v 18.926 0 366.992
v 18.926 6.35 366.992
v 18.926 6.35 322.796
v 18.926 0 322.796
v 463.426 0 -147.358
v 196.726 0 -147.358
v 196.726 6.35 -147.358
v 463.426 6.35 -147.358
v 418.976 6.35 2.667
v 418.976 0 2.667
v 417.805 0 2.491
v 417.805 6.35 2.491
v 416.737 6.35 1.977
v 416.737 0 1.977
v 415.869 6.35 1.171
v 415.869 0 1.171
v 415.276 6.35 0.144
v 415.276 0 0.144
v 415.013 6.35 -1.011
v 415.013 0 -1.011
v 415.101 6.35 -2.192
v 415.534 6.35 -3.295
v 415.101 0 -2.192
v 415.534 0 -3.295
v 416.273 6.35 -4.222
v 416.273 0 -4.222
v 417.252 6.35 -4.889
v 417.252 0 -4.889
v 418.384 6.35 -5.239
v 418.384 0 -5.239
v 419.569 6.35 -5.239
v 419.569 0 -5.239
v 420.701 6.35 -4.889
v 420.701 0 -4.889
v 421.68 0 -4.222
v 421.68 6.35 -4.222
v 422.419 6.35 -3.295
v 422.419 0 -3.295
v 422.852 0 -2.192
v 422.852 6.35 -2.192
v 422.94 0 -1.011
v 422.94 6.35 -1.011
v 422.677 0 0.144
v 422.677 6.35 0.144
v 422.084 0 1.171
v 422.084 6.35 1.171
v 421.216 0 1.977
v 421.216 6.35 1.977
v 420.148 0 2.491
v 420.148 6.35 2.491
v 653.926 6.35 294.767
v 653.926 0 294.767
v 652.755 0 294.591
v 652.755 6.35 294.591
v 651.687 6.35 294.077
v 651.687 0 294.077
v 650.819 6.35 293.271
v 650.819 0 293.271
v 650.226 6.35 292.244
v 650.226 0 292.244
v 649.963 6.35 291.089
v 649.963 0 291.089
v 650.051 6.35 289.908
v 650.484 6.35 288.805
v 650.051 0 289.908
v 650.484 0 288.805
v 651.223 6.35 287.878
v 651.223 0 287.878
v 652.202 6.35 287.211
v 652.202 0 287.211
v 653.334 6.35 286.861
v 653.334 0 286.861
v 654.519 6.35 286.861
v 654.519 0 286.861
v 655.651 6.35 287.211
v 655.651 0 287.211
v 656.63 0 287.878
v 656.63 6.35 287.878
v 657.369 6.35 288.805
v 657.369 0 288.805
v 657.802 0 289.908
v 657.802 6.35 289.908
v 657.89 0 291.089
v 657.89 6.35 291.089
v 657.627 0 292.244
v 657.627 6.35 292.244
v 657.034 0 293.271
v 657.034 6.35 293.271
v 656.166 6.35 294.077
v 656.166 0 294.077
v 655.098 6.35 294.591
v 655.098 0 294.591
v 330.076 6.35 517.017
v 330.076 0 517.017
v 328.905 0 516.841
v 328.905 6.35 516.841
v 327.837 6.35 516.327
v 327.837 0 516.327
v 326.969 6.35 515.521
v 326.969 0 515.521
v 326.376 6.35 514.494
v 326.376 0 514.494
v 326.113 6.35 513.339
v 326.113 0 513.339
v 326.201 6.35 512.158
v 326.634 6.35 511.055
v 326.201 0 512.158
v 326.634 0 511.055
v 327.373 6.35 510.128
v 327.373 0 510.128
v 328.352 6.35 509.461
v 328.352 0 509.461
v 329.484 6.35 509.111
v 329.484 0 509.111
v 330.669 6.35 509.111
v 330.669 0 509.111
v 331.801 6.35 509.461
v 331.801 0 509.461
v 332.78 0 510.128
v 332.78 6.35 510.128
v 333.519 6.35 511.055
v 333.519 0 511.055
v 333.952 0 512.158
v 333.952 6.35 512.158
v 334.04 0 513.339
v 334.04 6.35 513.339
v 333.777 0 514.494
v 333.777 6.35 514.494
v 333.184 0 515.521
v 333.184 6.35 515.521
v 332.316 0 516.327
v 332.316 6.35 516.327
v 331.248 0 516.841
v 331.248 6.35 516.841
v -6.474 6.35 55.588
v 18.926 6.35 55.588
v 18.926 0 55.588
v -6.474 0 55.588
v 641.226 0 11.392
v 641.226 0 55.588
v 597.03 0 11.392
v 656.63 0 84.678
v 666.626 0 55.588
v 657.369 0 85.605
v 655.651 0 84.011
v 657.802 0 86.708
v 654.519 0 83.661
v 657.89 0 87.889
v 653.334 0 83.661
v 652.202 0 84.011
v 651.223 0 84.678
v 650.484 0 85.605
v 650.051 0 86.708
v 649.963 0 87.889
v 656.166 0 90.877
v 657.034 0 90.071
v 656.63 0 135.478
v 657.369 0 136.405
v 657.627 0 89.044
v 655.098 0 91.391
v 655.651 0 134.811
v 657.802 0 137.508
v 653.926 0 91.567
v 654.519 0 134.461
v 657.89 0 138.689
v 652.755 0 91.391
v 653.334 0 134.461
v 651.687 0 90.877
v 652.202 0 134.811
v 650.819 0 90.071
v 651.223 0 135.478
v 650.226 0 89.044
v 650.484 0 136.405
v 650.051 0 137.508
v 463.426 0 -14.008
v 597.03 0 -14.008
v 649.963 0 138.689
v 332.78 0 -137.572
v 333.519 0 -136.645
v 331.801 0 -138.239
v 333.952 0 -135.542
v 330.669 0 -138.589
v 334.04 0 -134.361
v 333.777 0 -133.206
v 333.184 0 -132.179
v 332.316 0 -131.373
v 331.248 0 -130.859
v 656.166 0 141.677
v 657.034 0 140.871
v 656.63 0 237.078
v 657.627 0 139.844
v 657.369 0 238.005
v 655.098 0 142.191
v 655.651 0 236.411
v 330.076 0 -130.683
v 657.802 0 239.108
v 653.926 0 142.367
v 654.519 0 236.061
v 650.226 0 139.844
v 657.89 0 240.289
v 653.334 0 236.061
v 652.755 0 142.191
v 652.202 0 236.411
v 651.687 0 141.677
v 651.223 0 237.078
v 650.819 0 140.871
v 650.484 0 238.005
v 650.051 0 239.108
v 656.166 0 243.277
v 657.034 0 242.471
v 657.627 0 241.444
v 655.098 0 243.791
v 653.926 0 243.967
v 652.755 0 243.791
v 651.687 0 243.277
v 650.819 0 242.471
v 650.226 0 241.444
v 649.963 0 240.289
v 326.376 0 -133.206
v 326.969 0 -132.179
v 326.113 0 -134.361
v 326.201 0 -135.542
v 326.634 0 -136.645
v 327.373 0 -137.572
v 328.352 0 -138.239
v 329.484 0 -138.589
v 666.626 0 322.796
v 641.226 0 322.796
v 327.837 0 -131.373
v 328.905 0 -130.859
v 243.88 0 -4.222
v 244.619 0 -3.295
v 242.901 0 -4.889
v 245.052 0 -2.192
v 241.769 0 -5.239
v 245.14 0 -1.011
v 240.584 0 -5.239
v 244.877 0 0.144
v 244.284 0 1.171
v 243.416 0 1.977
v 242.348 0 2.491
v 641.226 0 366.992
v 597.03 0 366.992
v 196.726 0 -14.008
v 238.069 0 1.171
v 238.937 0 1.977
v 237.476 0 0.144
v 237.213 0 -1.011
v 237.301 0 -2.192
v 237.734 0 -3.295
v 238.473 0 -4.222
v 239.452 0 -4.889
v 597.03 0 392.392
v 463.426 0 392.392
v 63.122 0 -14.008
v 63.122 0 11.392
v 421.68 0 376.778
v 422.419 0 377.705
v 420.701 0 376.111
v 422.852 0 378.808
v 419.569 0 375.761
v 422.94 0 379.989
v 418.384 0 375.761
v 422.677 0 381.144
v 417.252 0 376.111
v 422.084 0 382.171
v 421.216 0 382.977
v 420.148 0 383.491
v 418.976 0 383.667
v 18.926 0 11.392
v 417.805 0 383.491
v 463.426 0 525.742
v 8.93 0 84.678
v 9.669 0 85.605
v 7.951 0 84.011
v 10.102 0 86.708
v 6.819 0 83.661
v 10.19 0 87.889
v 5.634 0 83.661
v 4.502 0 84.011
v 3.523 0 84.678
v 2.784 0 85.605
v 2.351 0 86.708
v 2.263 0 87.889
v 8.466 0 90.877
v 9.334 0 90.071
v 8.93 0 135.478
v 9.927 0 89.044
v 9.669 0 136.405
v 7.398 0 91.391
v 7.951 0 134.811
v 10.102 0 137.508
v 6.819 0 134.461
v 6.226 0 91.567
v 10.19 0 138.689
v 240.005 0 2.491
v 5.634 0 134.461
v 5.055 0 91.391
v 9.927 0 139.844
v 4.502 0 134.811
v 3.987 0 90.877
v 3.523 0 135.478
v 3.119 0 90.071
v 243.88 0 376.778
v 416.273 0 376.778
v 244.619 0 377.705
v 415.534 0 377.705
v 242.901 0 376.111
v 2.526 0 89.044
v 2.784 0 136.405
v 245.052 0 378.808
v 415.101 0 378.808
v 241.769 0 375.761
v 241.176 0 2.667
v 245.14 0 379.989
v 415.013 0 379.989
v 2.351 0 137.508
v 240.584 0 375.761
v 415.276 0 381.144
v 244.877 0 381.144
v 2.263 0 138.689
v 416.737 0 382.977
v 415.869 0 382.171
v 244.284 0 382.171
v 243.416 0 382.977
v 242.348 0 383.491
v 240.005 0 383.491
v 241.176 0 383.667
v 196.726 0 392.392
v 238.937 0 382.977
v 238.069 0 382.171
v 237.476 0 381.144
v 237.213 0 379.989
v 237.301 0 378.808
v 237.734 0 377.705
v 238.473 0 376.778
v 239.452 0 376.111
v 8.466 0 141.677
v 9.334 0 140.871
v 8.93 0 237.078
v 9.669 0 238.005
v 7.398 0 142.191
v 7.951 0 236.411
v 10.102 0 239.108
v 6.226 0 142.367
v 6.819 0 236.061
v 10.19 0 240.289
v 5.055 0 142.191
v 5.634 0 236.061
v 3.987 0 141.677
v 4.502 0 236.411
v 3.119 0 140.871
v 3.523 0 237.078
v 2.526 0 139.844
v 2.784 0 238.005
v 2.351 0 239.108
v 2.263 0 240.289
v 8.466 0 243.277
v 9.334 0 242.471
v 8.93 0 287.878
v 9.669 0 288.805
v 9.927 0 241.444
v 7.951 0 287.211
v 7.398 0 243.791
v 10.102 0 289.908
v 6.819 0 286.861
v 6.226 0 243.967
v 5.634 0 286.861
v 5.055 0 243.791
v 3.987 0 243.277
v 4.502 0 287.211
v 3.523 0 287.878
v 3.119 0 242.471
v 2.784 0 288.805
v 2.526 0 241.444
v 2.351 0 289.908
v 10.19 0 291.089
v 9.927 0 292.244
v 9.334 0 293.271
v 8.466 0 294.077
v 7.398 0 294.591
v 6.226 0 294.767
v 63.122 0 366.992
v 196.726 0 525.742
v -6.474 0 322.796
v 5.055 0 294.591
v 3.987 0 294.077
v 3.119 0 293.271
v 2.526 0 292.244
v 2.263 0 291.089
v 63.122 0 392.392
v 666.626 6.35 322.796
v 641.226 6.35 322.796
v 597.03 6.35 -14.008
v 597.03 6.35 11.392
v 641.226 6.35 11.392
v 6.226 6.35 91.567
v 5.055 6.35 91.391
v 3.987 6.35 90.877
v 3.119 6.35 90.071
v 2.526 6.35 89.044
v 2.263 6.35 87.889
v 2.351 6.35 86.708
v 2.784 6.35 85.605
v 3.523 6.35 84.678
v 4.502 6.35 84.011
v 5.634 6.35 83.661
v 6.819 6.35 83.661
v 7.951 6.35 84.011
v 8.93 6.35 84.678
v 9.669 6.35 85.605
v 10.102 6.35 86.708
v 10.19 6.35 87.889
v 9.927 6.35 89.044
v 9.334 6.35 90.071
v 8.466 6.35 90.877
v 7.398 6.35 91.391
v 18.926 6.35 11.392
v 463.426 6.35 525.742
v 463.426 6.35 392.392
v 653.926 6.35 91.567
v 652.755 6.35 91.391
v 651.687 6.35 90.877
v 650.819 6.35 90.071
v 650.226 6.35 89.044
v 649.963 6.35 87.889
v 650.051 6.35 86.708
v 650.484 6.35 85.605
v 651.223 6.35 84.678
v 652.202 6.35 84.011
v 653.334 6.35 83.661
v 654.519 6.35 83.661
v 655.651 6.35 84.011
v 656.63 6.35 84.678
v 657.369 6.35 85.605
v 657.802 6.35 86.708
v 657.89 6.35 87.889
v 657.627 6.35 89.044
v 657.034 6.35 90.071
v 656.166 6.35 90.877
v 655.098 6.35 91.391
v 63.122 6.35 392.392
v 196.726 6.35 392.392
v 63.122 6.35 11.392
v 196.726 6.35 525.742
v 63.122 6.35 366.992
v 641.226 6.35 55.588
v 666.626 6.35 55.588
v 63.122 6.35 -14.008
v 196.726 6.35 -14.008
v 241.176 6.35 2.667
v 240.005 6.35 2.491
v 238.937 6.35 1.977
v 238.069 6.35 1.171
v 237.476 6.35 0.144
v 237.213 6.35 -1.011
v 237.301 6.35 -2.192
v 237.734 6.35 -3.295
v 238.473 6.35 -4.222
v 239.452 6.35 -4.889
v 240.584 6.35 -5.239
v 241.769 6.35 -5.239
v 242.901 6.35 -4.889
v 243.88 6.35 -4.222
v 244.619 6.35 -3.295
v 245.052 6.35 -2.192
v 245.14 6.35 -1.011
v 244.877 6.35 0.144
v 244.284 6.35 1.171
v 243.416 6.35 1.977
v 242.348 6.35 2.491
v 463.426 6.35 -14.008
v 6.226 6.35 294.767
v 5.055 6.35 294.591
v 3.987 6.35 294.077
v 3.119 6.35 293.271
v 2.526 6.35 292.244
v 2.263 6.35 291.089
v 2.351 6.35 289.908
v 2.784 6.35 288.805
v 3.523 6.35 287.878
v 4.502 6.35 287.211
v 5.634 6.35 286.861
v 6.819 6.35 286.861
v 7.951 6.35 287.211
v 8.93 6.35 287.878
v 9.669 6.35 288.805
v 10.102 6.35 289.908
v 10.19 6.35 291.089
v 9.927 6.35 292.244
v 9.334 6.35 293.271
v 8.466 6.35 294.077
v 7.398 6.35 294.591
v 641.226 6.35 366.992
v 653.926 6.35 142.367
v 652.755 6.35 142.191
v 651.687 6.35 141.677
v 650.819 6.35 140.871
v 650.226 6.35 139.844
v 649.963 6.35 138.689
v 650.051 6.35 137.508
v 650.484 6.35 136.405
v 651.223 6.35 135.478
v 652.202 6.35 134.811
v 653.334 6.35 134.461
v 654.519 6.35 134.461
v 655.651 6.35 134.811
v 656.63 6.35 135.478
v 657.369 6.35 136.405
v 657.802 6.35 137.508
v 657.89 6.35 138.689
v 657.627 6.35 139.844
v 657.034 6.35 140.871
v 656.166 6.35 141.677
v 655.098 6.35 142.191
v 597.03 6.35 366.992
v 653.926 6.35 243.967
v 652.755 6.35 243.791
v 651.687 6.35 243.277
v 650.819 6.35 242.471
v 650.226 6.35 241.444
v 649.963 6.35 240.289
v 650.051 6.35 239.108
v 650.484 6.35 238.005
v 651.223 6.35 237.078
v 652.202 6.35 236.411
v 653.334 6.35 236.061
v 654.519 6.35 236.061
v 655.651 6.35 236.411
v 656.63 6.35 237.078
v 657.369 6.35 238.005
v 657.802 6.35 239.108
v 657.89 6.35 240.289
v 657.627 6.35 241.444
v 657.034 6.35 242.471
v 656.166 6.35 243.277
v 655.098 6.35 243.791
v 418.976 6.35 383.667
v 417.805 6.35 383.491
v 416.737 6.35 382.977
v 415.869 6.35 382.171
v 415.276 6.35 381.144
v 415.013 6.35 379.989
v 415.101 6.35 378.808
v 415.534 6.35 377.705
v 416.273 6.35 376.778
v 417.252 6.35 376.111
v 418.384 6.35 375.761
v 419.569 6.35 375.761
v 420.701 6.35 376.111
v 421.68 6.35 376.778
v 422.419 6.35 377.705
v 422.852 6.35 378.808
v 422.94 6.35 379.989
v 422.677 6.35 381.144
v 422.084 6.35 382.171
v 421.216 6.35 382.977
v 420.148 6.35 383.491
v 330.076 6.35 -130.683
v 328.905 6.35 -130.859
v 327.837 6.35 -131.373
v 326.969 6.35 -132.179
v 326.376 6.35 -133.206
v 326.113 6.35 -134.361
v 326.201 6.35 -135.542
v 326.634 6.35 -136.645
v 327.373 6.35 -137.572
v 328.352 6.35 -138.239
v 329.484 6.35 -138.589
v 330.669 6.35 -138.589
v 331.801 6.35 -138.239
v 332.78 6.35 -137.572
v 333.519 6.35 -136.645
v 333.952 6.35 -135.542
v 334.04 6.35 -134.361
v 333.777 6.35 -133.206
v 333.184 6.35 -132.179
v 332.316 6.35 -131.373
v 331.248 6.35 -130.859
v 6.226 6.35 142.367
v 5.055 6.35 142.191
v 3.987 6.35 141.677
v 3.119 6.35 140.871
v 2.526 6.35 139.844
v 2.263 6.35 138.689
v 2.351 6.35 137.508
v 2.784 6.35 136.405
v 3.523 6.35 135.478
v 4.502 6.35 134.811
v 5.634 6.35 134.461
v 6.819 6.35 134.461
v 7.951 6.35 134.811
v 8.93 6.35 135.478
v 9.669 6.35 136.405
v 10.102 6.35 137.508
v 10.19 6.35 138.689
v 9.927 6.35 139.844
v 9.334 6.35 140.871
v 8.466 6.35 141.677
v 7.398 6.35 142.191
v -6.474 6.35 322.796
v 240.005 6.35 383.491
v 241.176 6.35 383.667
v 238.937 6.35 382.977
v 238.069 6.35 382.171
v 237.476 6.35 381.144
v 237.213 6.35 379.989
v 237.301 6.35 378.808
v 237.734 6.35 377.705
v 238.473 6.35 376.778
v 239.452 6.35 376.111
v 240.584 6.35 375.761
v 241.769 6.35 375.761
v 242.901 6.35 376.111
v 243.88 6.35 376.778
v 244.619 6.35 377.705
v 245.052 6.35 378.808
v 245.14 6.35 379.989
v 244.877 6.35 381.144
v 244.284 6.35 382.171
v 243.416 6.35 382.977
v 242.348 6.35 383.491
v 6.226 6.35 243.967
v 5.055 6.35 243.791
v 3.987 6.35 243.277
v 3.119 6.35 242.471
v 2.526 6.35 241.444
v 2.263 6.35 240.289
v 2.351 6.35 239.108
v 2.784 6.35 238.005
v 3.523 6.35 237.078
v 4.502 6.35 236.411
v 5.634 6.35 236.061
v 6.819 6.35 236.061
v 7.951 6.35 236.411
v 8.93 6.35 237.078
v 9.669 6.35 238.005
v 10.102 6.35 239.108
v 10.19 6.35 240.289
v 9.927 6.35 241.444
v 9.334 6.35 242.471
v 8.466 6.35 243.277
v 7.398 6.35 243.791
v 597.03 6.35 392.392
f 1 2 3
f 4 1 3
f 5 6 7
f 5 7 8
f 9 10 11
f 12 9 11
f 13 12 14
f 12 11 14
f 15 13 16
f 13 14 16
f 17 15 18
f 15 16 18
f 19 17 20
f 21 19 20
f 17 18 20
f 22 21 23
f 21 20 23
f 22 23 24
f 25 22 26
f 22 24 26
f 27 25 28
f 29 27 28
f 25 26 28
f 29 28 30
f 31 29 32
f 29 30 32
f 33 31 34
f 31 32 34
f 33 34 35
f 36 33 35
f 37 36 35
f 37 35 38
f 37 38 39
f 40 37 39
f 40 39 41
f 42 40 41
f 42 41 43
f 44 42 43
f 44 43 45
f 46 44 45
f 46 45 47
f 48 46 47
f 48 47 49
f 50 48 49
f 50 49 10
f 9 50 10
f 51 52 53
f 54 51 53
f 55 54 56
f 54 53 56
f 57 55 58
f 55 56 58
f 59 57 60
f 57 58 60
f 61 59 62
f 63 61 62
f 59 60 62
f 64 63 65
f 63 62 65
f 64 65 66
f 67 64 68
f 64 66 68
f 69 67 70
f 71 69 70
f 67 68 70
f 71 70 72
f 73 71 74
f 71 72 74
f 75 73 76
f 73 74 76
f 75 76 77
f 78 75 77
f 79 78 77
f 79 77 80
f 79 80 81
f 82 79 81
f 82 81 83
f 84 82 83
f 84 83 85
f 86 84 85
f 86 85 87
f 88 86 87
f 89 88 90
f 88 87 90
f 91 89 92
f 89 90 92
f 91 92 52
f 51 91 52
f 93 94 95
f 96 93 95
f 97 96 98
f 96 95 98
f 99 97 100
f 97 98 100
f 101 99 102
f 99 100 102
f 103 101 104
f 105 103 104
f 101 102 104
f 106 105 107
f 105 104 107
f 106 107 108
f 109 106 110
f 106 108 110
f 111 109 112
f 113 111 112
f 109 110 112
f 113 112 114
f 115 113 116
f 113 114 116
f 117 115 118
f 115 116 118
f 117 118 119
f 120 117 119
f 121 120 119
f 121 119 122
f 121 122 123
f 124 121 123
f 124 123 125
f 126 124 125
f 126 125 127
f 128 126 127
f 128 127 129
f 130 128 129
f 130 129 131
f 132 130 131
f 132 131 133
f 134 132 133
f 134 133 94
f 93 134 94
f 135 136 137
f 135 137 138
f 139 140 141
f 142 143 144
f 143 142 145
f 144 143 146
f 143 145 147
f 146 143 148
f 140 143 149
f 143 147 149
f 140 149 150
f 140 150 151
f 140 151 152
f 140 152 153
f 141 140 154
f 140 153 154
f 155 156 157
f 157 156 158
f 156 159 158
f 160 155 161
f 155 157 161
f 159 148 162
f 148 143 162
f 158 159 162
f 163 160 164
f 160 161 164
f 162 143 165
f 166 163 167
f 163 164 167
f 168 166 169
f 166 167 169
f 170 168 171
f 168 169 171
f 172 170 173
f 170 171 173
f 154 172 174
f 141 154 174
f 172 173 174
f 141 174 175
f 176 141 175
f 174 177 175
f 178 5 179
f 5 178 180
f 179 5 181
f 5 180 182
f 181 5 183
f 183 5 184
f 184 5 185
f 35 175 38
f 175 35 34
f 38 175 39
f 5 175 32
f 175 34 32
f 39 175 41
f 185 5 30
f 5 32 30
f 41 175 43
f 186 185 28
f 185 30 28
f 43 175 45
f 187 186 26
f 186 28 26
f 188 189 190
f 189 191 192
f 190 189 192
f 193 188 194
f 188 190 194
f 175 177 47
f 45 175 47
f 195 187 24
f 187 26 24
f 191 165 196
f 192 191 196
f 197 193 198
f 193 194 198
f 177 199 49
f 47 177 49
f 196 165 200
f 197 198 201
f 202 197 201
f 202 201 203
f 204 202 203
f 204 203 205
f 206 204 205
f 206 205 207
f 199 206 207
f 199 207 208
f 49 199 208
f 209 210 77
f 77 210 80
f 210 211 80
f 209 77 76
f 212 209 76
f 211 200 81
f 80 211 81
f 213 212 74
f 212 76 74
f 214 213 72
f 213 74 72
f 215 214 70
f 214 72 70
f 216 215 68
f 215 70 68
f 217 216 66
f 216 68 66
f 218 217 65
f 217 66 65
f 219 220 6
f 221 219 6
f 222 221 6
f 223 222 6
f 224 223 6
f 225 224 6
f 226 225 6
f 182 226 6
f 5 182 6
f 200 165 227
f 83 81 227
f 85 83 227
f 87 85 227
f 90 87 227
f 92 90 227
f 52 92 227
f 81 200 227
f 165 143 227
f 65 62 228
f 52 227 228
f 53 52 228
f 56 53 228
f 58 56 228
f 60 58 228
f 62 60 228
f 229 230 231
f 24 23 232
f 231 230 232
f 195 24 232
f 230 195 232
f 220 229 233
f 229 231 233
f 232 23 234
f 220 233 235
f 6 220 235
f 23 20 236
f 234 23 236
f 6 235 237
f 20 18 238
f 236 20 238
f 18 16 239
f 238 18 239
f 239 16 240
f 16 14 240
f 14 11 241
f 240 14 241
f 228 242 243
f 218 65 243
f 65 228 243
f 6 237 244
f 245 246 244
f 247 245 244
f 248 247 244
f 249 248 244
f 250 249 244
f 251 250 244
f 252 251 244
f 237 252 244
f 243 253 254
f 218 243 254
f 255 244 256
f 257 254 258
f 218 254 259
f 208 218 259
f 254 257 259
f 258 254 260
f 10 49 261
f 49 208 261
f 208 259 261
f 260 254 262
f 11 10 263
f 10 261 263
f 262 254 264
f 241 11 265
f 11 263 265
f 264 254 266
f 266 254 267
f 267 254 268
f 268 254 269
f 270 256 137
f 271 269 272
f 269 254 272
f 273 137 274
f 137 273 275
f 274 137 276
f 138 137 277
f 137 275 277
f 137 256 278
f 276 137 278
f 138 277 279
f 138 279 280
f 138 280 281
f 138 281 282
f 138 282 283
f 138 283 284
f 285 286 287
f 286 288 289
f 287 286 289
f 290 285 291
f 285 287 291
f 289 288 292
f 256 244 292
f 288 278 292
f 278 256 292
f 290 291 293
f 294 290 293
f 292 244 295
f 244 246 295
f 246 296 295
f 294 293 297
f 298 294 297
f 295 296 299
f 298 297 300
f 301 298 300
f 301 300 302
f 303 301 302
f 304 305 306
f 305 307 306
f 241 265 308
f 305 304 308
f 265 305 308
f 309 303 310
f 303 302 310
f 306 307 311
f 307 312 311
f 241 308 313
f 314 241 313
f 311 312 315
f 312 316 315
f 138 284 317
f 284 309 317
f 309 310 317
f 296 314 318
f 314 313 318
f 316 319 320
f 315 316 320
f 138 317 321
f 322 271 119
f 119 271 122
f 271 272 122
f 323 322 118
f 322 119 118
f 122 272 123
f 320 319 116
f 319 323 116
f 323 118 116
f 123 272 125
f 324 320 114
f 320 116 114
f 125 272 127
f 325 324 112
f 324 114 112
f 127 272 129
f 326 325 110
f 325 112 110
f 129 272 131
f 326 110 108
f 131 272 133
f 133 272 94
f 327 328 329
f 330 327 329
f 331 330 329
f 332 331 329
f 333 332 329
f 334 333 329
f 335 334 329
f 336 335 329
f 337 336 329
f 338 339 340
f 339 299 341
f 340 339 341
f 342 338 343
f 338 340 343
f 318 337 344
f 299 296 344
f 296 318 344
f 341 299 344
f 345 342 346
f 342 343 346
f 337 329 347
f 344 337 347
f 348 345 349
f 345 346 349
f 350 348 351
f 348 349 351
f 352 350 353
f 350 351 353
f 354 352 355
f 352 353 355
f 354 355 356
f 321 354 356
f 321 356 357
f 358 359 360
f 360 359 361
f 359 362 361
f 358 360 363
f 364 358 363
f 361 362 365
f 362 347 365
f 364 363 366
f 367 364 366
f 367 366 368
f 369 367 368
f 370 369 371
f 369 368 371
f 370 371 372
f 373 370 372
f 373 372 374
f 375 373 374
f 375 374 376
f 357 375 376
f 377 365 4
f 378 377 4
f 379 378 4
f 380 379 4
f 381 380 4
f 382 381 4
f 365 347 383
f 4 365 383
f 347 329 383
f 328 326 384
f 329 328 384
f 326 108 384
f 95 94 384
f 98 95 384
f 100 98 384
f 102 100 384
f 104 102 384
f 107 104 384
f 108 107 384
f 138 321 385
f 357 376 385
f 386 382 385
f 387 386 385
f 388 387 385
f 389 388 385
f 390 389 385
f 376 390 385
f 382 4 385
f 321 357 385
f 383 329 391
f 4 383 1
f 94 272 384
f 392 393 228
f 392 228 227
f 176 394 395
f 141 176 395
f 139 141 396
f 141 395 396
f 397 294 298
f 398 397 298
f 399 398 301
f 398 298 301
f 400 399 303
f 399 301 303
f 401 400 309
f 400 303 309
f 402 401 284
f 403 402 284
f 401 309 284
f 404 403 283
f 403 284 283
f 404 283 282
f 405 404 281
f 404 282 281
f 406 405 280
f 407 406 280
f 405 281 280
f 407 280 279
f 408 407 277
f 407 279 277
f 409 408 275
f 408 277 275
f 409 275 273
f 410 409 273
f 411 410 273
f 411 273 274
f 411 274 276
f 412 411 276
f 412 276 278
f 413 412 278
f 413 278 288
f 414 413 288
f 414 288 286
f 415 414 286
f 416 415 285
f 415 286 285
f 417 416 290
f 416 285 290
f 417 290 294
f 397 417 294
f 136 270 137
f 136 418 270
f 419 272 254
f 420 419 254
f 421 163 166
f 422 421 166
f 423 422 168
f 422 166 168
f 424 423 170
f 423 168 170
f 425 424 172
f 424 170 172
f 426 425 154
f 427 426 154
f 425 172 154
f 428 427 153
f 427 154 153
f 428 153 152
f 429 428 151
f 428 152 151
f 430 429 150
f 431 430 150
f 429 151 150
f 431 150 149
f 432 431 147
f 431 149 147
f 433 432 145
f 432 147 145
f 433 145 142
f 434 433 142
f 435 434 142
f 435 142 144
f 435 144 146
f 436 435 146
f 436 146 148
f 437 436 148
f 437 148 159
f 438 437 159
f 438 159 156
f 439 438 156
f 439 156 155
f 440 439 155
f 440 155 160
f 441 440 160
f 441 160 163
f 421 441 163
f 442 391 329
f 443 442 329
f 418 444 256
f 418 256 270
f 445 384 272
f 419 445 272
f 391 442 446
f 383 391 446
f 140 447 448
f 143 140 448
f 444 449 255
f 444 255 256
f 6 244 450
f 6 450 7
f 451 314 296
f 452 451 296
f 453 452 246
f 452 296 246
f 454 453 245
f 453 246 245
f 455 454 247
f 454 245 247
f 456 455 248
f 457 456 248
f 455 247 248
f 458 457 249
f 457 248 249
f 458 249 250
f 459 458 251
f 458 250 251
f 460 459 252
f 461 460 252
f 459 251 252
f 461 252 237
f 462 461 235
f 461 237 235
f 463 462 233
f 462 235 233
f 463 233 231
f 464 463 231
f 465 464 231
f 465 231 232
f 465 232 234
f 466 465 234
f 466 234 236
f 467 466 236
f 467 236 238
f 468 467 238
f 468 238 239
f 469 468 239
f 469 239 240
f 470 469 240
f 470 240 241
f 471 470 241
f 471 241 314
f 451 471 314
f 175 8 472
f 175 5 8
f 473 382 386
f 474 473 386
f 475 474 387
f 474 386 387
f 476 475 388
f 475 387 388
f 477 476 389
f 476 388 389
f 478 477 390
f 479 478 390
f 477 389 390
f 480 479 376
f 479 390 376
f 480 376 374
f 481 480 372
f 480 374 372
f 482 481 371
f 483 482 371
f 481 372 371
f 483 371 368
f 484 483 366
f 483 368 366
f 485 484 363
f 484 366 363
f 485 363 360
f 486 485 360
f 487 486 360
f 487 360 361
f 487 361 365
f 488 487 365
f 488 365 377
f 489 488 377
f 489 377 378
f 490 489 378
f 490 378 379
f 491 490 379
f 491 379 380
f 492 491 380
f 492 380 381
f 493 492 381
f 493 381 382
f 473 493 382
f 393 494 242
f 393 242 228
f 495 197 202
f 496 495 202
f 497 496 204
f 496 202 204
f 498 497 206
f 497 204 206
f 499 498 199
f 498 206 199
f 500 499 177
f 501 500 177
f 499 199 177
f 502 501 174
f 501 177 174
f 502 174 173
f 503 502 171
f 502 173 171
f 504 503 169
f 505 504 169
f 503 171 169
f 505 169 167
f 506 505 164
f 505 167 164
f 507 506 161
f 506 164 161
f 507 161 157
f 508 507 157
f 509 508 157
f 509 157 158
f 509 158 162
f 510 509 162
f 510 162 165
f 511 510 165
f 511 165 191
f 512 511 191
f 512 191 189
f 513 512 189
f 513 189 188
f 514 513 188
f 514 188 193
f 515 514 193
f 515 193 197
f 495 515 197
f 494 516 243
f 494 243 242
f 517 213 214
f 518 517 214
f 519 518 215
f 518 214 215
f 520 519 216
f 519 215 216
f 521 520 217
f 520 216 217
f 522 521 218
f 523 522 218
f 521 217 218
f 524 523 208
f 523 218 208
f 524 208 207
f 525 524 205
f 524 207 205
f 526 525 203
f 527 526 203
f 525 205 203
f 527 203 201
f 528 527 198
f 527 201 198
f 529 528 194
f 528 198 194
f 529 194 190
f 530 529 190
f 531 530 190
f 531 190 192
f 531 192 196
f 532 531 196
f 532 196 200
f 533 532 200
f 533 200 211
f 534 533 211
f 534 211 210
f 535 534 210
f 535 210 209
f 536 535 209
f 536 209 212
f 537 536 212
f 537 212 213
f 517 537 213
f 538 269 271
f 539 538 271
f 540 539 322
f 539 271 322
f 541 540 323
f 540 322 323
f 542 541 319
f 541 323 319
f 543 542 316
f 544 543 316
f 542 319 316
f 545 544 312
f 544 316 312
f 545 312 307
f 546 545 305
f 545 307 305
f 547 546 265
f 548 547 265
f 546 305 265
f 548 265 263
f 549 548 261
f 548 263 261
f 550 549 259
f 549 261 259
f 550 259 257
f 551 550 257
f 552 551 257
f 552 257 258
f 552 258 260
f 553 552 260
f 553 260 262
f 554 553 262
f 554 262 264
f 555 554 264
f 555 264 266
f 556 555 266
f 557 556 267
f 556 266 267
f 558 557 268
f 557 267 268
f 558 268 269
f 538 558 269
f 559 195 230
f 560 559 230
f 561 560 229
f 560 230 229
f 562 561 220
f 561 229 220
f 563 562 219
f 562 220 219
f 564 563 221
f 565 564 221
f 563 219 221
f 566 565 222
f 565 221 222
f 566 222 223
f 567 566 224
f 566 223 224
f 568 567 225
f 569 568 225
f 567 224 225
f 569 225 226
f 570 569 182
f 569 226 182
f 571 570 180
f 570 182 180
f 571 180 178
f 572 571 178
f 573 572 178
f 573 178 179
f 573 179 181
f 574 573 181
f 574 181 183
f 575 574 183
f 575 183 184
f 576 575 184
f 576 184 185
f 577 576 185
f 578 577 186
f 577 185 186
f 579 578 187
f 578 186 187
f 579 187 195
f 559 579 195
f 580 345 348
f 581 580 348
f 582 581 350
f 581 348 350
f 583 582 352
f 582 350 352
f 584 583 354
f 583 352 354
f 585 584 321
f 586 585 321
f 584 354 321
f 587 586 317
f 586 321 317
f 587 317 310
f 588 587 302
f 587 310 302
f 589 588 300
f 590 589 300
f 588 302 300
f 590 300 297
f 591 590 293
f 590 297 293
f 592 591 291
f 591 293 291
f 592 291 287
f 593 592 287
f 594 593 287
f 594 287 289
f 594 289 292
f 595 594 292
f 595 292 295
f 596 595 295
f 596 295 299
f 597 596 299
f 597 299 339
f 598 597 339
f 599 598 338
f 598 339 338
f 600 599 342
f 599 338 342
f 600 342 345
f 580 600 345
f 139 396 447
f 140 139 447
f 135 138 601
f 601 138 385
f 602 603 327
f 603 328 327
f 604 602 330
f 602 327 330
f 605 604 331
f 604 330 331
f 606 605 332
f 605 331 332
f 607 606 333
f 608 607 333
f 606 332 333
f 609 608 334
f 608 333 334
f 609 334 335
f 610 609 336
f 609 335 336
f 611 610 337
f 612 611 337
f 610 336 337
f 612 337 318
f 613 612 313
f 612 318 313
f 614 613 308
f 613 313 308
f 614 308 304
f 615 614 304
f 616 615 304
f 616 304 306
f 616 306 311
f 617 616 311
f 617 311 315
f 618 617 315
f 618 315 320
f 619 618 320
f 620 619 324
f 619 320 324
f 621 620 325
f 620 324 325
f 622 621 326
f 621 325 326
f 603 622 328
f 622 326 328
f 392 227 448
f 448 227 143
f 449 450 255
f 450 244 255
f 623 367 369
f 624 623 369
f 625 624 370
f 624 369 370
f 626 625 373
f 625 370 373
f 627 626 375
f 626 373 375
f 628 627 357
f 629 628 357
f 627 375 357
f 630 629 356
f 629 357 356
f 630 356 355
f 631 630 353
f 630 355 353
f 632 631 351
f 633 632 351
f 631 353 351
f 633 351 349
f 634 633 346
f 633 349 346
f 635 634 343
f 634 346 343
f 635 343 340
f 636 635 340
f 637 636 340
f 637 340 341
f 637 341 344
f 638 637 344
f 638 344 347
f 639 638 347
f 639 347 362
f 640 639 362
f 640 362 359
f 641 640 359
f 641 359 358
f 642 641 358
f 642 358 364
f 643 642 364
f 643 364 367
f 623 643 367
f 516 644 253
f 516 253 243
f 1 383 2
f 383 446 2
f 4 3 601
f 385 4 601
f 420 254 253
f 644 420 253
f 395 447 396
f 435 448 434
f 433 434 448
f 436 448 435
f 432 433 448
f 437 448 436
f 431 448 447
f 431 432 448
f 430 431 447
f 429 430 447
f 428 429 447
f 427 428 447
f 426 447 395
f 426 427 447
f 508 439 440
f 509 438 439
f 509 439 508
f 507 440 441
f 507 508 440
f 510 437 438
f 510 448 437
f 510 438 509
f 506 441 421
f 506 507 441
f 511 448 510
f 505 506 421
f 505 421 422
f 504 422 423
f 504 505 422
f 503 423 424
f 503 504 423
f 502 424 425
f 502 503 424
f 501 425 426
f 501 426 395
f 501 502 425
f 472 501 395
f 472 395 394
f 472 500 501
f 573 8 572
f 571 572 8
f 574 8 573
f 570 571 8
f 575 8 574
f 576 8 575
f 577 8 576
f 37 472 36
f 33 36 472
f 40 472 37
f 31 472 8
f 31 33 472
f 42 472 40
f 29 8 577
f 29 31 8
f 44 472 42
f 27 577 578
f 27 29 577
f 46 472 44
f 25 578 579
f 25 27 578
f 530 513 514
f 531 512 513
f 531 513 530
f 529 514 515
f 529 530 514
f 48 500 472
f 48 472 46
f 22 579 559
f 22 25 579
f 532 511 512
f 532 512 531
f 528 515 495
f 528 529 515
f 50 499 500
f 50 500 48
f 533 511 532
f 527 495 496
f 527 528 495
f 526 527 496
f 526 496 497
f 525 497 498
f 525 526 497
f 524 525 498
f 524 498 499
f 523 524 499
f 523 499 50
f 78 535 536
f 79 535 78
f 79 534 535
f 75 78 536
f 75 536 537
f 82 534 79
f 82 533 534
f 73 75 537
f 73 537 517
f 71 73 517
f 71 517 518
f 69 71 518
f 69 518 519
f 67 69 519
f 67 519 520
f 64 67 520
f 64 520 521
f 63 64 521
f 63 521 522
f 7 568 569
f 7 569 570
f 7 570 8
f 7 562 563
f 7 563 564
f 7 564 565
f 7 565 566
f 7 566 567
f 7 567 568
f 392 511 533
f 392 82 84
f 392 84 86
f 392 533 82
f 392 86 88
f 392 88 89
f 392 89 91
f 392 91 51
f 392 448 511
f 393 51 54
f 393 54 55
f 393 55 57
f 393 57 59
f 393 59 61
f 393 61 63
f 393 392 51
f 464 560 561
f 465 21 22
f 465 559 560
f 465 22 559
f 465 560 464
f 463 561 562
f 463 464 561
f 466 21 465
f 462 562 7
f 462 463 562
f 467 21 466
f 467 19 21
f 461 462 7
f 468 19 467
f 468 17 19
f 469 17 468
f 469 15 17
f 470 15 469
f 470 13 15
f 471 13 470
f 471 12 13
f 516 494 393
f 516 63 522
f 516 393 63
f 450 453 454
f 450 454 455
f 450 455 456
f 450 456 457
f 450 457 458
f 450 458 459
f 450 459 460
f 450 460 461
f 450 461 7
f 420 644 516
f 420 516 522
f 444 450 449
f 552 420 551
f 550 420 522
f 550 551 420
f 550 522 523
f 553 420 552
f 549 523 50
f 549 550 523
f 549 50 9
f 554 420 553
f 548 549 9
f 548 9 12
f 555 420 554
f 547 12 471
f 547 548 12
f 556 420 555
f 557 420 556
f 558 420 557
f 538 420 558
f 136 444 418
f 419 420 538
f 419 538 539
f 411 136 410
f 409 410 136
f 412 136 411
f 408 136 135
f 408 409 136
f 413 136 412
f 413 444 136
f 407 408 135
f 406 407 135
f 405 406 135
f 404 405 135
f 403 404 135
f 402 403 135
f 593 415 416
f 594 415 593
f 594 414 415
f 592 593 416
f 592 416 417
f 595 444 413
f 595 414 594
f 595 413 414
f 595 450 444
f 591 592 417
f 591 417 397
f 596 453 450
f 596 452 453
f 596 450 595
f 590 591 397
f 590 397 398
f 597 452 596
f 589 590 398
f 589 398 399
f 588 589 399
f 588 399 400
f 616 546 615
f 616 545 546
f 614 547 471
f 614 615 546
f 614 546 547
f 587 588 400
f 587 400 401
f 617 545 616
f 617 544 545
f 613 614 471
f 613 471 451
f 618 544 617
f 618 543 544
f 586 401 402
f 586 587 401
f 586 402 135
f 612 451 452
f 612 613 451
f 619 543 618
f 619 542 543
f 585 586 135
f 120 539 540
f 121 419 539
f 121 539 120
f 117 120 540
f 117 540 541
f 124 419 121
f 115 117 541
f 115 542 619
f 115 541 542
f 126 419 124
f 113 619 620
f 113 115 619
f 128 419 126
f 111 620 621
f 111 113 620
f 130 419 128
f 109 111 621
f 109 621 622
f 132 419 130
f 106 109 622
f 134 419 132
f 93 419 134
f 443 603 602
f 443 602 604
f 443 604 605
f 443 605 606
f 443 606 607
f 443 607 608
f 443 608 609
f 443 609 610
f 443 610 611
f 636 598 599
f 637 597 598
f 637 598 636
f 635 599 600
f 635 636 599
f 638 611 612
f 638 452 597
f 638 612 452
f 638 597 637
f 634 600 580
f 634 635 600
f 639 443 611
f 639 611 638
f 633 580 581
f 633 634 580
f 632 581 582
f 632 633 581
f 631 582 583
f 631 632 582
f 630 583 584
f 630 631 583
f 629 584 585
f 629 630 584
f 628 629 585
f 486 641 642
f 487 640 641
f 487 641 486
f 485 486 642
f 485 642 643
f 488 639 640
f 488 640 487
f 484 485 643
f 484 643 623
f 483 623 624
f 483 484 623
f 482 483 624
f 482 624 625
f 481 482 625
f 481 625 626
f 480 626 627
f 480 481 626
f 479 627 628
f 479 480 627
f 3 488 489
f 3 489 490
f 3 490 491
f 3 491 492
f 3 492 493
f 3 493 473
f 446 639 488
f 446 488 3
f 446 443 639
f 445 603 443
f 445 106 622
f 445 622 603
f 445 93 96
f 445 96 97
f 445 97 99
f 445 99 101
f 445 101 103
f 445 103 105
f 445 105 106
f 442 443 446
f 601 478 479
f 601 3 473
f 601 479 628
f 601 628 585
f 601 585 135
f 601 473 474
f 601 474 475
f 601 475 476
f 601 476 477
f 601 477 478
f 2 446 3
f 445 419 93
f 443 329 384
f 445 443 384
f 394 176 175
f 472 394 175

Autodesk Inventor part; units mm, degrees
ref_plane "YZ Plane" through (0, 0, 0) normal (1, 0, 0) x (0, 1, 0)
ref_plane "XZ Plane" through (0, 0, 0) normal (0, 1, 0) x (-1, 0, 0)
ref_plane "XY Plane" through (0, 0, 0) normal (0, 0, 1) x (1, 0, 0)
sketch "Sketch1" plane through (0, 0, 0) normal (0, 1, 0) x (-1, 0, 0)
  line L0 (-666.6265, 392.3922) -> (-666.6265, -14.0078)
  line L1 (6.4735, -14.0078) -> (6.4735, 392.3922)
  line L2 (-196.7265, 392.3922) -> (-196.7265, 525.7422)
  line L3 (-196.7265, 525.7422) -> (-463.4265, 525.7422)
  line L4 (-463.4265, 525.7422) -> (-463.4265, 392.3922)
  line L5 (6.4735, 392.3922) -> (-196.7265, 392.3922)
  line L6 (-463.4265, 392.3922) -> (-666.6265, 392.3922)
  line L7 (-196.7265, -14.0078) -> (-196.7265, -147.3578)
  line L8 (-196.7265, -147.3578) -> (-463.4265, -147.3578)
  line L9 (-463.4265, -147.3578) -> (-463.4265, -14.0078)
  line L10 (-666.6265, -14.0078) -> (-463.4265, -14.0078)
  line L11 (-196.7265, -14.0078) -> (6.4735, -14.0078)
  point P0 (0, 0)
  dimension "d0" = 673.1
  dimension "d1" = 406.4
  dimension "d73" = 266.7
  dimension "d75" = 203.2
  dimension "d76" = 266.7
extrude "Extrusion1" add sketch "Sketch1" along normal blind 6.35
sketch "Sketch2" plane through (0, 6.35, 0) normal (0, 1, 0) x (1, 0, 0)
  line L0 (666.6265, -392.3922) -> (666.6265, 14.0078) projected
  line L1 (666.6265, -392.3922) -> (666.6265, -290.7922)
  line L2 (666.6265, -290.7922) -> (666.6265, -189.1922) construction
  line L3 (666.6265, 14.0078) -> (666.6265, -58.7236) construction
  line L4 (666.6265, 14.0078) -> (666.6265, -87.5922) construction
  line L5 (-6.4735, 14.0078) -> (-6.4735, -392.3922) construction
  line L6 (-6.4735, -392.3922) -> (241.1765, -392.3922) construction
  line L7 (-6.4735, -392.3922) -> (666.6265, -392.3922) construction
  line L8 (666.6265, -392.3922) -> (418.9765, -392.3922) construction
  circle A0 centre (653.9265, -290.7922) radius 3.175
  circle A1 centre (653.9265, -87.5922) radius 3.175
  circle A2 centre (241.1765, -379.6922) radius 3.175
  circle A3 centre (418.9765, -379.6922) radius 3.175
  circle A4 centre (418.9765, 1.3078) radius 3.175
  circle A5 centre (241.1765, 1.3078) radius 3.175
  circle A6 centre (6.2265, -87.5922) radius 3.175
  circle A7 centre (6.2265, -290.7922) radius 3.175
  circle A8 centre (6.2265, -239.9922) radius 3.9751
  circle A9 centre (6.2265, -138.3922) radius 3.9751
  circle A10 centre (653.9265, -239.9922) radius 3.9751
  circle A11 centre (653.9265, -138.3922) radius 3.9751
  line L9 (458.3979, 14.0078) -> (460.8865, 14.0078)
  line L10 (460.8865, 14.0078) -> (460.8865, -3.7722)
  line L11 (460.8865, -3.7722) -> (448.1865, -3.7722)
  line L12 (448.1865, -3.7722) -> (448.1865, 7.197)
  line L13 (448.1865, 7.197) -> (460.8865, 7.197)
  line L14 (460.8865, 7.197) -> (460.8865, -3.7722)
  line L15 (666.6265, 14.0078) -> (-6.4735, 14.0078) projected
  circle A12 centre (330.0765, -513.0422) radius 3.9751
  line L16 (196.7265, -392.3922) -> (196.7265, -525.7422) projected
  circle A13 centre (330.0765, 134.6578) radius 3.9751
  line L17 (196.7265, 147.3578) -> (196.7265, 14.0078) projected
  line L18 (196.7265, -525.7422) -> (463.4265, -525.7422) projected
  line L19 (463.4265, 147.3578) -> (196.7265, 147.3578) projected
  point P0 (0, 0)
  dimension "d11" = 6.35
  dimension "d12" = 6.35
  dimension "d13" = 12.7
  dimension "d14" = 12.7
  dimension "d15" = 6.35
  dimension "d16" = 12.7
  dimension "d17" = 6.35
  dimension "d18" = 12.7
  dimension "d19" = 6.35
  dimension "d20" = 6.35
  dimension "d23" = 6.35
  dimension "d24" = 6.35
  dimension "d25" = 12.7
  dimension "d26" = 12.7
  dimension "d34" = 7.9502
  dimension "d35" = 7.9502
  dimension "d40" = 50.8
  dimension "d43" = 50.8
  dimension "d44" = 7.9502
  dimension "d45" = 7.9502
  dimension "d46" = 50.8
  dimension "d66" = 205.74
  dimension "d68" = 12.7
  dimension "d70" = 17.78
  dimension "d78" = 7.9502
  dimension "d79" = 133.35
  dimension "d80" = 7.9502
  dimension "d81" = 133.35
  dimension "d82" = 12.7
  dimension "d83" = 12.7
hole "Hole1" at (653.9265, 6.35, 290.7922) at (653.9265, 6.35, 87.5922) at (418.9765, 6.35, -1.3078) at (241.1765, 6.35, -1.3078) at (418.9765, 6.35, 379.6922) at (241.1765, 6.35, 379.6922) at (6.2265, 6.35, 290.7922) at (6.2265, 6.35, 87.5922) at (6.2265, 6.35, 239.9922) at (6.2265, 6.35, 138.3922) at (653.9265, 6.35, 239.9922) at (653.9265, 6.35, 138.3922) at (330.0765, 6.35, 513.0422) at (330.0765, 6.35, -134.6578) direction (0, -1, 0) diameter 7.9502 end through all
sketch "Sketch3" plane through (0, 6.35, 0) normal (0, 1, 0) x (1, 0, 0)
  line L0 (-6.4735, -392.3922) -> (666.6265, -392.3922) projected
  line L1 (-6.4735, -392.3922) -> (63.1225, -392.3922)
  line L2 (63.1225, -392.3922) -> (63.1225, -366.9922)
  line L3 (63.1225, -366.9922) -> (18.9265, -366.9922)
  line L4 (-6.4735, -366.9922) -> (-6.4735, -392.3922)
  line L5 (-6.4735, -392.3922) -> (18.9265, -392.3922)
  line L6 (18.9265, -366.9922) -> (18.9265, -322.7962)
  line L7 (18.9265, -322.7962) -> (-6.4735, -322.7962)
  line L8 (-6.4735, -322.7962) -> (-6.4735, -392.3922)
  line L9 (666.6265, 14.0078) -> (-6.4735, 14.0078) projected
  line L10 (-6.4735, 14.0078) -> (63.1225, 14.0078)
  line L11 (63.1225, 14.0078) -> (63.1225, -11.3922)
  line L12 (63.1225, -11.3922) -> (18.9265, -11.3922)
  line L13 (-6.4735, -11.3922) -> (-6.4735, 14.0078)
  line L14 (-6.4735, 14.0078) -> (18.9265, 14.0078)
  line L15 (18.9265, -11.3922) -> (18.9265, -55.5882)
  line L16 (18.9265, -55.5882) -> (-6.4735, -55.5882)
  line L17 (-6.4735, -55.5882) -> (-6.4735, 14.0078)
  line L18 (666.6265, -392.3922) -> (641.2265, -392.3922)
  line L19 (641.2265, -366.9922) -> (641.2265, -322.7962)
  line L20 (641.2265, -322.7962) -> (666.6265, -322.7962)
  line L21 (666.6265, -322.7962) -> (666.6265, -392.3922)
  line L22 (666.6265, -392.3922) -> (597.0305, -392.3922)
  line L23 (597.0305, -392.3922) -> (597.0305, -366.9922)
  line L24 (597.0305, -366.9922) -> (641.2265, -366.9922)
  line L25 (666.6265, -366.9922) -> (666.6265, -392.3922)
  line L26 (666.6265, 14.0078) -> (597.0305, 14.0078)
  line L27 (597.0305, 14.0078) -> (597.0305, -11.3922)
  line L28 (597.0305, -11.3922) -> (641.2265, -11.3922)
  line L29 (666.6265, -11.3922) -> (666.6265, 14.0078)
  line L30 (666.6265, 14.0078) -> (641.2265, 14.0078)
  line L31 (641.2265, -11.3922) -> (641.2265, -55.5882)
  line L32 (641.2265, -55.5882) -> (666.6265, -55.5882)
  line L33 (666.6265, -55.5882) -> (666.6265, 14.0078)
  point P0 (0, 0)
  dimension "d47" = 69.596
  dimension "d48" = 25.4
  dimension "d49" = 25.4
  dimension "d50" = 69.596
  dimension "d51" = 69.596
  dimension "d52" = 25.4
  dimension "d53" = 25.4
  dimension "d54" = 69.596
  dimension "d55" = 25.4
  dimension "d56" = 69.596
  dimension "d57" = 69.596
  dimension "d58" = 25.4
  dimension "d59" = 69.596
  dimension "d60" = 25.4
  dimension "d61" = 25.4
  dimension "d62" = 69.596
extrude "Extrusion2" cut sketch "Sketch3" against normal blind 25.4
sketch "Sketch4" plane through (0, 6.35, 0) normal (0, 1, 0) x (1, 0, 0)
  line L0 (-6.4735, -55.5882) -> (-6.4735, -322.7962) construction
  line L1 (666.6265, -322.7962) -> (666.6265, -55.5882) construction
  point P0 (0, 0)
properties part number "Polyc_for_swerve" material "Polycarbonate, Clear"
